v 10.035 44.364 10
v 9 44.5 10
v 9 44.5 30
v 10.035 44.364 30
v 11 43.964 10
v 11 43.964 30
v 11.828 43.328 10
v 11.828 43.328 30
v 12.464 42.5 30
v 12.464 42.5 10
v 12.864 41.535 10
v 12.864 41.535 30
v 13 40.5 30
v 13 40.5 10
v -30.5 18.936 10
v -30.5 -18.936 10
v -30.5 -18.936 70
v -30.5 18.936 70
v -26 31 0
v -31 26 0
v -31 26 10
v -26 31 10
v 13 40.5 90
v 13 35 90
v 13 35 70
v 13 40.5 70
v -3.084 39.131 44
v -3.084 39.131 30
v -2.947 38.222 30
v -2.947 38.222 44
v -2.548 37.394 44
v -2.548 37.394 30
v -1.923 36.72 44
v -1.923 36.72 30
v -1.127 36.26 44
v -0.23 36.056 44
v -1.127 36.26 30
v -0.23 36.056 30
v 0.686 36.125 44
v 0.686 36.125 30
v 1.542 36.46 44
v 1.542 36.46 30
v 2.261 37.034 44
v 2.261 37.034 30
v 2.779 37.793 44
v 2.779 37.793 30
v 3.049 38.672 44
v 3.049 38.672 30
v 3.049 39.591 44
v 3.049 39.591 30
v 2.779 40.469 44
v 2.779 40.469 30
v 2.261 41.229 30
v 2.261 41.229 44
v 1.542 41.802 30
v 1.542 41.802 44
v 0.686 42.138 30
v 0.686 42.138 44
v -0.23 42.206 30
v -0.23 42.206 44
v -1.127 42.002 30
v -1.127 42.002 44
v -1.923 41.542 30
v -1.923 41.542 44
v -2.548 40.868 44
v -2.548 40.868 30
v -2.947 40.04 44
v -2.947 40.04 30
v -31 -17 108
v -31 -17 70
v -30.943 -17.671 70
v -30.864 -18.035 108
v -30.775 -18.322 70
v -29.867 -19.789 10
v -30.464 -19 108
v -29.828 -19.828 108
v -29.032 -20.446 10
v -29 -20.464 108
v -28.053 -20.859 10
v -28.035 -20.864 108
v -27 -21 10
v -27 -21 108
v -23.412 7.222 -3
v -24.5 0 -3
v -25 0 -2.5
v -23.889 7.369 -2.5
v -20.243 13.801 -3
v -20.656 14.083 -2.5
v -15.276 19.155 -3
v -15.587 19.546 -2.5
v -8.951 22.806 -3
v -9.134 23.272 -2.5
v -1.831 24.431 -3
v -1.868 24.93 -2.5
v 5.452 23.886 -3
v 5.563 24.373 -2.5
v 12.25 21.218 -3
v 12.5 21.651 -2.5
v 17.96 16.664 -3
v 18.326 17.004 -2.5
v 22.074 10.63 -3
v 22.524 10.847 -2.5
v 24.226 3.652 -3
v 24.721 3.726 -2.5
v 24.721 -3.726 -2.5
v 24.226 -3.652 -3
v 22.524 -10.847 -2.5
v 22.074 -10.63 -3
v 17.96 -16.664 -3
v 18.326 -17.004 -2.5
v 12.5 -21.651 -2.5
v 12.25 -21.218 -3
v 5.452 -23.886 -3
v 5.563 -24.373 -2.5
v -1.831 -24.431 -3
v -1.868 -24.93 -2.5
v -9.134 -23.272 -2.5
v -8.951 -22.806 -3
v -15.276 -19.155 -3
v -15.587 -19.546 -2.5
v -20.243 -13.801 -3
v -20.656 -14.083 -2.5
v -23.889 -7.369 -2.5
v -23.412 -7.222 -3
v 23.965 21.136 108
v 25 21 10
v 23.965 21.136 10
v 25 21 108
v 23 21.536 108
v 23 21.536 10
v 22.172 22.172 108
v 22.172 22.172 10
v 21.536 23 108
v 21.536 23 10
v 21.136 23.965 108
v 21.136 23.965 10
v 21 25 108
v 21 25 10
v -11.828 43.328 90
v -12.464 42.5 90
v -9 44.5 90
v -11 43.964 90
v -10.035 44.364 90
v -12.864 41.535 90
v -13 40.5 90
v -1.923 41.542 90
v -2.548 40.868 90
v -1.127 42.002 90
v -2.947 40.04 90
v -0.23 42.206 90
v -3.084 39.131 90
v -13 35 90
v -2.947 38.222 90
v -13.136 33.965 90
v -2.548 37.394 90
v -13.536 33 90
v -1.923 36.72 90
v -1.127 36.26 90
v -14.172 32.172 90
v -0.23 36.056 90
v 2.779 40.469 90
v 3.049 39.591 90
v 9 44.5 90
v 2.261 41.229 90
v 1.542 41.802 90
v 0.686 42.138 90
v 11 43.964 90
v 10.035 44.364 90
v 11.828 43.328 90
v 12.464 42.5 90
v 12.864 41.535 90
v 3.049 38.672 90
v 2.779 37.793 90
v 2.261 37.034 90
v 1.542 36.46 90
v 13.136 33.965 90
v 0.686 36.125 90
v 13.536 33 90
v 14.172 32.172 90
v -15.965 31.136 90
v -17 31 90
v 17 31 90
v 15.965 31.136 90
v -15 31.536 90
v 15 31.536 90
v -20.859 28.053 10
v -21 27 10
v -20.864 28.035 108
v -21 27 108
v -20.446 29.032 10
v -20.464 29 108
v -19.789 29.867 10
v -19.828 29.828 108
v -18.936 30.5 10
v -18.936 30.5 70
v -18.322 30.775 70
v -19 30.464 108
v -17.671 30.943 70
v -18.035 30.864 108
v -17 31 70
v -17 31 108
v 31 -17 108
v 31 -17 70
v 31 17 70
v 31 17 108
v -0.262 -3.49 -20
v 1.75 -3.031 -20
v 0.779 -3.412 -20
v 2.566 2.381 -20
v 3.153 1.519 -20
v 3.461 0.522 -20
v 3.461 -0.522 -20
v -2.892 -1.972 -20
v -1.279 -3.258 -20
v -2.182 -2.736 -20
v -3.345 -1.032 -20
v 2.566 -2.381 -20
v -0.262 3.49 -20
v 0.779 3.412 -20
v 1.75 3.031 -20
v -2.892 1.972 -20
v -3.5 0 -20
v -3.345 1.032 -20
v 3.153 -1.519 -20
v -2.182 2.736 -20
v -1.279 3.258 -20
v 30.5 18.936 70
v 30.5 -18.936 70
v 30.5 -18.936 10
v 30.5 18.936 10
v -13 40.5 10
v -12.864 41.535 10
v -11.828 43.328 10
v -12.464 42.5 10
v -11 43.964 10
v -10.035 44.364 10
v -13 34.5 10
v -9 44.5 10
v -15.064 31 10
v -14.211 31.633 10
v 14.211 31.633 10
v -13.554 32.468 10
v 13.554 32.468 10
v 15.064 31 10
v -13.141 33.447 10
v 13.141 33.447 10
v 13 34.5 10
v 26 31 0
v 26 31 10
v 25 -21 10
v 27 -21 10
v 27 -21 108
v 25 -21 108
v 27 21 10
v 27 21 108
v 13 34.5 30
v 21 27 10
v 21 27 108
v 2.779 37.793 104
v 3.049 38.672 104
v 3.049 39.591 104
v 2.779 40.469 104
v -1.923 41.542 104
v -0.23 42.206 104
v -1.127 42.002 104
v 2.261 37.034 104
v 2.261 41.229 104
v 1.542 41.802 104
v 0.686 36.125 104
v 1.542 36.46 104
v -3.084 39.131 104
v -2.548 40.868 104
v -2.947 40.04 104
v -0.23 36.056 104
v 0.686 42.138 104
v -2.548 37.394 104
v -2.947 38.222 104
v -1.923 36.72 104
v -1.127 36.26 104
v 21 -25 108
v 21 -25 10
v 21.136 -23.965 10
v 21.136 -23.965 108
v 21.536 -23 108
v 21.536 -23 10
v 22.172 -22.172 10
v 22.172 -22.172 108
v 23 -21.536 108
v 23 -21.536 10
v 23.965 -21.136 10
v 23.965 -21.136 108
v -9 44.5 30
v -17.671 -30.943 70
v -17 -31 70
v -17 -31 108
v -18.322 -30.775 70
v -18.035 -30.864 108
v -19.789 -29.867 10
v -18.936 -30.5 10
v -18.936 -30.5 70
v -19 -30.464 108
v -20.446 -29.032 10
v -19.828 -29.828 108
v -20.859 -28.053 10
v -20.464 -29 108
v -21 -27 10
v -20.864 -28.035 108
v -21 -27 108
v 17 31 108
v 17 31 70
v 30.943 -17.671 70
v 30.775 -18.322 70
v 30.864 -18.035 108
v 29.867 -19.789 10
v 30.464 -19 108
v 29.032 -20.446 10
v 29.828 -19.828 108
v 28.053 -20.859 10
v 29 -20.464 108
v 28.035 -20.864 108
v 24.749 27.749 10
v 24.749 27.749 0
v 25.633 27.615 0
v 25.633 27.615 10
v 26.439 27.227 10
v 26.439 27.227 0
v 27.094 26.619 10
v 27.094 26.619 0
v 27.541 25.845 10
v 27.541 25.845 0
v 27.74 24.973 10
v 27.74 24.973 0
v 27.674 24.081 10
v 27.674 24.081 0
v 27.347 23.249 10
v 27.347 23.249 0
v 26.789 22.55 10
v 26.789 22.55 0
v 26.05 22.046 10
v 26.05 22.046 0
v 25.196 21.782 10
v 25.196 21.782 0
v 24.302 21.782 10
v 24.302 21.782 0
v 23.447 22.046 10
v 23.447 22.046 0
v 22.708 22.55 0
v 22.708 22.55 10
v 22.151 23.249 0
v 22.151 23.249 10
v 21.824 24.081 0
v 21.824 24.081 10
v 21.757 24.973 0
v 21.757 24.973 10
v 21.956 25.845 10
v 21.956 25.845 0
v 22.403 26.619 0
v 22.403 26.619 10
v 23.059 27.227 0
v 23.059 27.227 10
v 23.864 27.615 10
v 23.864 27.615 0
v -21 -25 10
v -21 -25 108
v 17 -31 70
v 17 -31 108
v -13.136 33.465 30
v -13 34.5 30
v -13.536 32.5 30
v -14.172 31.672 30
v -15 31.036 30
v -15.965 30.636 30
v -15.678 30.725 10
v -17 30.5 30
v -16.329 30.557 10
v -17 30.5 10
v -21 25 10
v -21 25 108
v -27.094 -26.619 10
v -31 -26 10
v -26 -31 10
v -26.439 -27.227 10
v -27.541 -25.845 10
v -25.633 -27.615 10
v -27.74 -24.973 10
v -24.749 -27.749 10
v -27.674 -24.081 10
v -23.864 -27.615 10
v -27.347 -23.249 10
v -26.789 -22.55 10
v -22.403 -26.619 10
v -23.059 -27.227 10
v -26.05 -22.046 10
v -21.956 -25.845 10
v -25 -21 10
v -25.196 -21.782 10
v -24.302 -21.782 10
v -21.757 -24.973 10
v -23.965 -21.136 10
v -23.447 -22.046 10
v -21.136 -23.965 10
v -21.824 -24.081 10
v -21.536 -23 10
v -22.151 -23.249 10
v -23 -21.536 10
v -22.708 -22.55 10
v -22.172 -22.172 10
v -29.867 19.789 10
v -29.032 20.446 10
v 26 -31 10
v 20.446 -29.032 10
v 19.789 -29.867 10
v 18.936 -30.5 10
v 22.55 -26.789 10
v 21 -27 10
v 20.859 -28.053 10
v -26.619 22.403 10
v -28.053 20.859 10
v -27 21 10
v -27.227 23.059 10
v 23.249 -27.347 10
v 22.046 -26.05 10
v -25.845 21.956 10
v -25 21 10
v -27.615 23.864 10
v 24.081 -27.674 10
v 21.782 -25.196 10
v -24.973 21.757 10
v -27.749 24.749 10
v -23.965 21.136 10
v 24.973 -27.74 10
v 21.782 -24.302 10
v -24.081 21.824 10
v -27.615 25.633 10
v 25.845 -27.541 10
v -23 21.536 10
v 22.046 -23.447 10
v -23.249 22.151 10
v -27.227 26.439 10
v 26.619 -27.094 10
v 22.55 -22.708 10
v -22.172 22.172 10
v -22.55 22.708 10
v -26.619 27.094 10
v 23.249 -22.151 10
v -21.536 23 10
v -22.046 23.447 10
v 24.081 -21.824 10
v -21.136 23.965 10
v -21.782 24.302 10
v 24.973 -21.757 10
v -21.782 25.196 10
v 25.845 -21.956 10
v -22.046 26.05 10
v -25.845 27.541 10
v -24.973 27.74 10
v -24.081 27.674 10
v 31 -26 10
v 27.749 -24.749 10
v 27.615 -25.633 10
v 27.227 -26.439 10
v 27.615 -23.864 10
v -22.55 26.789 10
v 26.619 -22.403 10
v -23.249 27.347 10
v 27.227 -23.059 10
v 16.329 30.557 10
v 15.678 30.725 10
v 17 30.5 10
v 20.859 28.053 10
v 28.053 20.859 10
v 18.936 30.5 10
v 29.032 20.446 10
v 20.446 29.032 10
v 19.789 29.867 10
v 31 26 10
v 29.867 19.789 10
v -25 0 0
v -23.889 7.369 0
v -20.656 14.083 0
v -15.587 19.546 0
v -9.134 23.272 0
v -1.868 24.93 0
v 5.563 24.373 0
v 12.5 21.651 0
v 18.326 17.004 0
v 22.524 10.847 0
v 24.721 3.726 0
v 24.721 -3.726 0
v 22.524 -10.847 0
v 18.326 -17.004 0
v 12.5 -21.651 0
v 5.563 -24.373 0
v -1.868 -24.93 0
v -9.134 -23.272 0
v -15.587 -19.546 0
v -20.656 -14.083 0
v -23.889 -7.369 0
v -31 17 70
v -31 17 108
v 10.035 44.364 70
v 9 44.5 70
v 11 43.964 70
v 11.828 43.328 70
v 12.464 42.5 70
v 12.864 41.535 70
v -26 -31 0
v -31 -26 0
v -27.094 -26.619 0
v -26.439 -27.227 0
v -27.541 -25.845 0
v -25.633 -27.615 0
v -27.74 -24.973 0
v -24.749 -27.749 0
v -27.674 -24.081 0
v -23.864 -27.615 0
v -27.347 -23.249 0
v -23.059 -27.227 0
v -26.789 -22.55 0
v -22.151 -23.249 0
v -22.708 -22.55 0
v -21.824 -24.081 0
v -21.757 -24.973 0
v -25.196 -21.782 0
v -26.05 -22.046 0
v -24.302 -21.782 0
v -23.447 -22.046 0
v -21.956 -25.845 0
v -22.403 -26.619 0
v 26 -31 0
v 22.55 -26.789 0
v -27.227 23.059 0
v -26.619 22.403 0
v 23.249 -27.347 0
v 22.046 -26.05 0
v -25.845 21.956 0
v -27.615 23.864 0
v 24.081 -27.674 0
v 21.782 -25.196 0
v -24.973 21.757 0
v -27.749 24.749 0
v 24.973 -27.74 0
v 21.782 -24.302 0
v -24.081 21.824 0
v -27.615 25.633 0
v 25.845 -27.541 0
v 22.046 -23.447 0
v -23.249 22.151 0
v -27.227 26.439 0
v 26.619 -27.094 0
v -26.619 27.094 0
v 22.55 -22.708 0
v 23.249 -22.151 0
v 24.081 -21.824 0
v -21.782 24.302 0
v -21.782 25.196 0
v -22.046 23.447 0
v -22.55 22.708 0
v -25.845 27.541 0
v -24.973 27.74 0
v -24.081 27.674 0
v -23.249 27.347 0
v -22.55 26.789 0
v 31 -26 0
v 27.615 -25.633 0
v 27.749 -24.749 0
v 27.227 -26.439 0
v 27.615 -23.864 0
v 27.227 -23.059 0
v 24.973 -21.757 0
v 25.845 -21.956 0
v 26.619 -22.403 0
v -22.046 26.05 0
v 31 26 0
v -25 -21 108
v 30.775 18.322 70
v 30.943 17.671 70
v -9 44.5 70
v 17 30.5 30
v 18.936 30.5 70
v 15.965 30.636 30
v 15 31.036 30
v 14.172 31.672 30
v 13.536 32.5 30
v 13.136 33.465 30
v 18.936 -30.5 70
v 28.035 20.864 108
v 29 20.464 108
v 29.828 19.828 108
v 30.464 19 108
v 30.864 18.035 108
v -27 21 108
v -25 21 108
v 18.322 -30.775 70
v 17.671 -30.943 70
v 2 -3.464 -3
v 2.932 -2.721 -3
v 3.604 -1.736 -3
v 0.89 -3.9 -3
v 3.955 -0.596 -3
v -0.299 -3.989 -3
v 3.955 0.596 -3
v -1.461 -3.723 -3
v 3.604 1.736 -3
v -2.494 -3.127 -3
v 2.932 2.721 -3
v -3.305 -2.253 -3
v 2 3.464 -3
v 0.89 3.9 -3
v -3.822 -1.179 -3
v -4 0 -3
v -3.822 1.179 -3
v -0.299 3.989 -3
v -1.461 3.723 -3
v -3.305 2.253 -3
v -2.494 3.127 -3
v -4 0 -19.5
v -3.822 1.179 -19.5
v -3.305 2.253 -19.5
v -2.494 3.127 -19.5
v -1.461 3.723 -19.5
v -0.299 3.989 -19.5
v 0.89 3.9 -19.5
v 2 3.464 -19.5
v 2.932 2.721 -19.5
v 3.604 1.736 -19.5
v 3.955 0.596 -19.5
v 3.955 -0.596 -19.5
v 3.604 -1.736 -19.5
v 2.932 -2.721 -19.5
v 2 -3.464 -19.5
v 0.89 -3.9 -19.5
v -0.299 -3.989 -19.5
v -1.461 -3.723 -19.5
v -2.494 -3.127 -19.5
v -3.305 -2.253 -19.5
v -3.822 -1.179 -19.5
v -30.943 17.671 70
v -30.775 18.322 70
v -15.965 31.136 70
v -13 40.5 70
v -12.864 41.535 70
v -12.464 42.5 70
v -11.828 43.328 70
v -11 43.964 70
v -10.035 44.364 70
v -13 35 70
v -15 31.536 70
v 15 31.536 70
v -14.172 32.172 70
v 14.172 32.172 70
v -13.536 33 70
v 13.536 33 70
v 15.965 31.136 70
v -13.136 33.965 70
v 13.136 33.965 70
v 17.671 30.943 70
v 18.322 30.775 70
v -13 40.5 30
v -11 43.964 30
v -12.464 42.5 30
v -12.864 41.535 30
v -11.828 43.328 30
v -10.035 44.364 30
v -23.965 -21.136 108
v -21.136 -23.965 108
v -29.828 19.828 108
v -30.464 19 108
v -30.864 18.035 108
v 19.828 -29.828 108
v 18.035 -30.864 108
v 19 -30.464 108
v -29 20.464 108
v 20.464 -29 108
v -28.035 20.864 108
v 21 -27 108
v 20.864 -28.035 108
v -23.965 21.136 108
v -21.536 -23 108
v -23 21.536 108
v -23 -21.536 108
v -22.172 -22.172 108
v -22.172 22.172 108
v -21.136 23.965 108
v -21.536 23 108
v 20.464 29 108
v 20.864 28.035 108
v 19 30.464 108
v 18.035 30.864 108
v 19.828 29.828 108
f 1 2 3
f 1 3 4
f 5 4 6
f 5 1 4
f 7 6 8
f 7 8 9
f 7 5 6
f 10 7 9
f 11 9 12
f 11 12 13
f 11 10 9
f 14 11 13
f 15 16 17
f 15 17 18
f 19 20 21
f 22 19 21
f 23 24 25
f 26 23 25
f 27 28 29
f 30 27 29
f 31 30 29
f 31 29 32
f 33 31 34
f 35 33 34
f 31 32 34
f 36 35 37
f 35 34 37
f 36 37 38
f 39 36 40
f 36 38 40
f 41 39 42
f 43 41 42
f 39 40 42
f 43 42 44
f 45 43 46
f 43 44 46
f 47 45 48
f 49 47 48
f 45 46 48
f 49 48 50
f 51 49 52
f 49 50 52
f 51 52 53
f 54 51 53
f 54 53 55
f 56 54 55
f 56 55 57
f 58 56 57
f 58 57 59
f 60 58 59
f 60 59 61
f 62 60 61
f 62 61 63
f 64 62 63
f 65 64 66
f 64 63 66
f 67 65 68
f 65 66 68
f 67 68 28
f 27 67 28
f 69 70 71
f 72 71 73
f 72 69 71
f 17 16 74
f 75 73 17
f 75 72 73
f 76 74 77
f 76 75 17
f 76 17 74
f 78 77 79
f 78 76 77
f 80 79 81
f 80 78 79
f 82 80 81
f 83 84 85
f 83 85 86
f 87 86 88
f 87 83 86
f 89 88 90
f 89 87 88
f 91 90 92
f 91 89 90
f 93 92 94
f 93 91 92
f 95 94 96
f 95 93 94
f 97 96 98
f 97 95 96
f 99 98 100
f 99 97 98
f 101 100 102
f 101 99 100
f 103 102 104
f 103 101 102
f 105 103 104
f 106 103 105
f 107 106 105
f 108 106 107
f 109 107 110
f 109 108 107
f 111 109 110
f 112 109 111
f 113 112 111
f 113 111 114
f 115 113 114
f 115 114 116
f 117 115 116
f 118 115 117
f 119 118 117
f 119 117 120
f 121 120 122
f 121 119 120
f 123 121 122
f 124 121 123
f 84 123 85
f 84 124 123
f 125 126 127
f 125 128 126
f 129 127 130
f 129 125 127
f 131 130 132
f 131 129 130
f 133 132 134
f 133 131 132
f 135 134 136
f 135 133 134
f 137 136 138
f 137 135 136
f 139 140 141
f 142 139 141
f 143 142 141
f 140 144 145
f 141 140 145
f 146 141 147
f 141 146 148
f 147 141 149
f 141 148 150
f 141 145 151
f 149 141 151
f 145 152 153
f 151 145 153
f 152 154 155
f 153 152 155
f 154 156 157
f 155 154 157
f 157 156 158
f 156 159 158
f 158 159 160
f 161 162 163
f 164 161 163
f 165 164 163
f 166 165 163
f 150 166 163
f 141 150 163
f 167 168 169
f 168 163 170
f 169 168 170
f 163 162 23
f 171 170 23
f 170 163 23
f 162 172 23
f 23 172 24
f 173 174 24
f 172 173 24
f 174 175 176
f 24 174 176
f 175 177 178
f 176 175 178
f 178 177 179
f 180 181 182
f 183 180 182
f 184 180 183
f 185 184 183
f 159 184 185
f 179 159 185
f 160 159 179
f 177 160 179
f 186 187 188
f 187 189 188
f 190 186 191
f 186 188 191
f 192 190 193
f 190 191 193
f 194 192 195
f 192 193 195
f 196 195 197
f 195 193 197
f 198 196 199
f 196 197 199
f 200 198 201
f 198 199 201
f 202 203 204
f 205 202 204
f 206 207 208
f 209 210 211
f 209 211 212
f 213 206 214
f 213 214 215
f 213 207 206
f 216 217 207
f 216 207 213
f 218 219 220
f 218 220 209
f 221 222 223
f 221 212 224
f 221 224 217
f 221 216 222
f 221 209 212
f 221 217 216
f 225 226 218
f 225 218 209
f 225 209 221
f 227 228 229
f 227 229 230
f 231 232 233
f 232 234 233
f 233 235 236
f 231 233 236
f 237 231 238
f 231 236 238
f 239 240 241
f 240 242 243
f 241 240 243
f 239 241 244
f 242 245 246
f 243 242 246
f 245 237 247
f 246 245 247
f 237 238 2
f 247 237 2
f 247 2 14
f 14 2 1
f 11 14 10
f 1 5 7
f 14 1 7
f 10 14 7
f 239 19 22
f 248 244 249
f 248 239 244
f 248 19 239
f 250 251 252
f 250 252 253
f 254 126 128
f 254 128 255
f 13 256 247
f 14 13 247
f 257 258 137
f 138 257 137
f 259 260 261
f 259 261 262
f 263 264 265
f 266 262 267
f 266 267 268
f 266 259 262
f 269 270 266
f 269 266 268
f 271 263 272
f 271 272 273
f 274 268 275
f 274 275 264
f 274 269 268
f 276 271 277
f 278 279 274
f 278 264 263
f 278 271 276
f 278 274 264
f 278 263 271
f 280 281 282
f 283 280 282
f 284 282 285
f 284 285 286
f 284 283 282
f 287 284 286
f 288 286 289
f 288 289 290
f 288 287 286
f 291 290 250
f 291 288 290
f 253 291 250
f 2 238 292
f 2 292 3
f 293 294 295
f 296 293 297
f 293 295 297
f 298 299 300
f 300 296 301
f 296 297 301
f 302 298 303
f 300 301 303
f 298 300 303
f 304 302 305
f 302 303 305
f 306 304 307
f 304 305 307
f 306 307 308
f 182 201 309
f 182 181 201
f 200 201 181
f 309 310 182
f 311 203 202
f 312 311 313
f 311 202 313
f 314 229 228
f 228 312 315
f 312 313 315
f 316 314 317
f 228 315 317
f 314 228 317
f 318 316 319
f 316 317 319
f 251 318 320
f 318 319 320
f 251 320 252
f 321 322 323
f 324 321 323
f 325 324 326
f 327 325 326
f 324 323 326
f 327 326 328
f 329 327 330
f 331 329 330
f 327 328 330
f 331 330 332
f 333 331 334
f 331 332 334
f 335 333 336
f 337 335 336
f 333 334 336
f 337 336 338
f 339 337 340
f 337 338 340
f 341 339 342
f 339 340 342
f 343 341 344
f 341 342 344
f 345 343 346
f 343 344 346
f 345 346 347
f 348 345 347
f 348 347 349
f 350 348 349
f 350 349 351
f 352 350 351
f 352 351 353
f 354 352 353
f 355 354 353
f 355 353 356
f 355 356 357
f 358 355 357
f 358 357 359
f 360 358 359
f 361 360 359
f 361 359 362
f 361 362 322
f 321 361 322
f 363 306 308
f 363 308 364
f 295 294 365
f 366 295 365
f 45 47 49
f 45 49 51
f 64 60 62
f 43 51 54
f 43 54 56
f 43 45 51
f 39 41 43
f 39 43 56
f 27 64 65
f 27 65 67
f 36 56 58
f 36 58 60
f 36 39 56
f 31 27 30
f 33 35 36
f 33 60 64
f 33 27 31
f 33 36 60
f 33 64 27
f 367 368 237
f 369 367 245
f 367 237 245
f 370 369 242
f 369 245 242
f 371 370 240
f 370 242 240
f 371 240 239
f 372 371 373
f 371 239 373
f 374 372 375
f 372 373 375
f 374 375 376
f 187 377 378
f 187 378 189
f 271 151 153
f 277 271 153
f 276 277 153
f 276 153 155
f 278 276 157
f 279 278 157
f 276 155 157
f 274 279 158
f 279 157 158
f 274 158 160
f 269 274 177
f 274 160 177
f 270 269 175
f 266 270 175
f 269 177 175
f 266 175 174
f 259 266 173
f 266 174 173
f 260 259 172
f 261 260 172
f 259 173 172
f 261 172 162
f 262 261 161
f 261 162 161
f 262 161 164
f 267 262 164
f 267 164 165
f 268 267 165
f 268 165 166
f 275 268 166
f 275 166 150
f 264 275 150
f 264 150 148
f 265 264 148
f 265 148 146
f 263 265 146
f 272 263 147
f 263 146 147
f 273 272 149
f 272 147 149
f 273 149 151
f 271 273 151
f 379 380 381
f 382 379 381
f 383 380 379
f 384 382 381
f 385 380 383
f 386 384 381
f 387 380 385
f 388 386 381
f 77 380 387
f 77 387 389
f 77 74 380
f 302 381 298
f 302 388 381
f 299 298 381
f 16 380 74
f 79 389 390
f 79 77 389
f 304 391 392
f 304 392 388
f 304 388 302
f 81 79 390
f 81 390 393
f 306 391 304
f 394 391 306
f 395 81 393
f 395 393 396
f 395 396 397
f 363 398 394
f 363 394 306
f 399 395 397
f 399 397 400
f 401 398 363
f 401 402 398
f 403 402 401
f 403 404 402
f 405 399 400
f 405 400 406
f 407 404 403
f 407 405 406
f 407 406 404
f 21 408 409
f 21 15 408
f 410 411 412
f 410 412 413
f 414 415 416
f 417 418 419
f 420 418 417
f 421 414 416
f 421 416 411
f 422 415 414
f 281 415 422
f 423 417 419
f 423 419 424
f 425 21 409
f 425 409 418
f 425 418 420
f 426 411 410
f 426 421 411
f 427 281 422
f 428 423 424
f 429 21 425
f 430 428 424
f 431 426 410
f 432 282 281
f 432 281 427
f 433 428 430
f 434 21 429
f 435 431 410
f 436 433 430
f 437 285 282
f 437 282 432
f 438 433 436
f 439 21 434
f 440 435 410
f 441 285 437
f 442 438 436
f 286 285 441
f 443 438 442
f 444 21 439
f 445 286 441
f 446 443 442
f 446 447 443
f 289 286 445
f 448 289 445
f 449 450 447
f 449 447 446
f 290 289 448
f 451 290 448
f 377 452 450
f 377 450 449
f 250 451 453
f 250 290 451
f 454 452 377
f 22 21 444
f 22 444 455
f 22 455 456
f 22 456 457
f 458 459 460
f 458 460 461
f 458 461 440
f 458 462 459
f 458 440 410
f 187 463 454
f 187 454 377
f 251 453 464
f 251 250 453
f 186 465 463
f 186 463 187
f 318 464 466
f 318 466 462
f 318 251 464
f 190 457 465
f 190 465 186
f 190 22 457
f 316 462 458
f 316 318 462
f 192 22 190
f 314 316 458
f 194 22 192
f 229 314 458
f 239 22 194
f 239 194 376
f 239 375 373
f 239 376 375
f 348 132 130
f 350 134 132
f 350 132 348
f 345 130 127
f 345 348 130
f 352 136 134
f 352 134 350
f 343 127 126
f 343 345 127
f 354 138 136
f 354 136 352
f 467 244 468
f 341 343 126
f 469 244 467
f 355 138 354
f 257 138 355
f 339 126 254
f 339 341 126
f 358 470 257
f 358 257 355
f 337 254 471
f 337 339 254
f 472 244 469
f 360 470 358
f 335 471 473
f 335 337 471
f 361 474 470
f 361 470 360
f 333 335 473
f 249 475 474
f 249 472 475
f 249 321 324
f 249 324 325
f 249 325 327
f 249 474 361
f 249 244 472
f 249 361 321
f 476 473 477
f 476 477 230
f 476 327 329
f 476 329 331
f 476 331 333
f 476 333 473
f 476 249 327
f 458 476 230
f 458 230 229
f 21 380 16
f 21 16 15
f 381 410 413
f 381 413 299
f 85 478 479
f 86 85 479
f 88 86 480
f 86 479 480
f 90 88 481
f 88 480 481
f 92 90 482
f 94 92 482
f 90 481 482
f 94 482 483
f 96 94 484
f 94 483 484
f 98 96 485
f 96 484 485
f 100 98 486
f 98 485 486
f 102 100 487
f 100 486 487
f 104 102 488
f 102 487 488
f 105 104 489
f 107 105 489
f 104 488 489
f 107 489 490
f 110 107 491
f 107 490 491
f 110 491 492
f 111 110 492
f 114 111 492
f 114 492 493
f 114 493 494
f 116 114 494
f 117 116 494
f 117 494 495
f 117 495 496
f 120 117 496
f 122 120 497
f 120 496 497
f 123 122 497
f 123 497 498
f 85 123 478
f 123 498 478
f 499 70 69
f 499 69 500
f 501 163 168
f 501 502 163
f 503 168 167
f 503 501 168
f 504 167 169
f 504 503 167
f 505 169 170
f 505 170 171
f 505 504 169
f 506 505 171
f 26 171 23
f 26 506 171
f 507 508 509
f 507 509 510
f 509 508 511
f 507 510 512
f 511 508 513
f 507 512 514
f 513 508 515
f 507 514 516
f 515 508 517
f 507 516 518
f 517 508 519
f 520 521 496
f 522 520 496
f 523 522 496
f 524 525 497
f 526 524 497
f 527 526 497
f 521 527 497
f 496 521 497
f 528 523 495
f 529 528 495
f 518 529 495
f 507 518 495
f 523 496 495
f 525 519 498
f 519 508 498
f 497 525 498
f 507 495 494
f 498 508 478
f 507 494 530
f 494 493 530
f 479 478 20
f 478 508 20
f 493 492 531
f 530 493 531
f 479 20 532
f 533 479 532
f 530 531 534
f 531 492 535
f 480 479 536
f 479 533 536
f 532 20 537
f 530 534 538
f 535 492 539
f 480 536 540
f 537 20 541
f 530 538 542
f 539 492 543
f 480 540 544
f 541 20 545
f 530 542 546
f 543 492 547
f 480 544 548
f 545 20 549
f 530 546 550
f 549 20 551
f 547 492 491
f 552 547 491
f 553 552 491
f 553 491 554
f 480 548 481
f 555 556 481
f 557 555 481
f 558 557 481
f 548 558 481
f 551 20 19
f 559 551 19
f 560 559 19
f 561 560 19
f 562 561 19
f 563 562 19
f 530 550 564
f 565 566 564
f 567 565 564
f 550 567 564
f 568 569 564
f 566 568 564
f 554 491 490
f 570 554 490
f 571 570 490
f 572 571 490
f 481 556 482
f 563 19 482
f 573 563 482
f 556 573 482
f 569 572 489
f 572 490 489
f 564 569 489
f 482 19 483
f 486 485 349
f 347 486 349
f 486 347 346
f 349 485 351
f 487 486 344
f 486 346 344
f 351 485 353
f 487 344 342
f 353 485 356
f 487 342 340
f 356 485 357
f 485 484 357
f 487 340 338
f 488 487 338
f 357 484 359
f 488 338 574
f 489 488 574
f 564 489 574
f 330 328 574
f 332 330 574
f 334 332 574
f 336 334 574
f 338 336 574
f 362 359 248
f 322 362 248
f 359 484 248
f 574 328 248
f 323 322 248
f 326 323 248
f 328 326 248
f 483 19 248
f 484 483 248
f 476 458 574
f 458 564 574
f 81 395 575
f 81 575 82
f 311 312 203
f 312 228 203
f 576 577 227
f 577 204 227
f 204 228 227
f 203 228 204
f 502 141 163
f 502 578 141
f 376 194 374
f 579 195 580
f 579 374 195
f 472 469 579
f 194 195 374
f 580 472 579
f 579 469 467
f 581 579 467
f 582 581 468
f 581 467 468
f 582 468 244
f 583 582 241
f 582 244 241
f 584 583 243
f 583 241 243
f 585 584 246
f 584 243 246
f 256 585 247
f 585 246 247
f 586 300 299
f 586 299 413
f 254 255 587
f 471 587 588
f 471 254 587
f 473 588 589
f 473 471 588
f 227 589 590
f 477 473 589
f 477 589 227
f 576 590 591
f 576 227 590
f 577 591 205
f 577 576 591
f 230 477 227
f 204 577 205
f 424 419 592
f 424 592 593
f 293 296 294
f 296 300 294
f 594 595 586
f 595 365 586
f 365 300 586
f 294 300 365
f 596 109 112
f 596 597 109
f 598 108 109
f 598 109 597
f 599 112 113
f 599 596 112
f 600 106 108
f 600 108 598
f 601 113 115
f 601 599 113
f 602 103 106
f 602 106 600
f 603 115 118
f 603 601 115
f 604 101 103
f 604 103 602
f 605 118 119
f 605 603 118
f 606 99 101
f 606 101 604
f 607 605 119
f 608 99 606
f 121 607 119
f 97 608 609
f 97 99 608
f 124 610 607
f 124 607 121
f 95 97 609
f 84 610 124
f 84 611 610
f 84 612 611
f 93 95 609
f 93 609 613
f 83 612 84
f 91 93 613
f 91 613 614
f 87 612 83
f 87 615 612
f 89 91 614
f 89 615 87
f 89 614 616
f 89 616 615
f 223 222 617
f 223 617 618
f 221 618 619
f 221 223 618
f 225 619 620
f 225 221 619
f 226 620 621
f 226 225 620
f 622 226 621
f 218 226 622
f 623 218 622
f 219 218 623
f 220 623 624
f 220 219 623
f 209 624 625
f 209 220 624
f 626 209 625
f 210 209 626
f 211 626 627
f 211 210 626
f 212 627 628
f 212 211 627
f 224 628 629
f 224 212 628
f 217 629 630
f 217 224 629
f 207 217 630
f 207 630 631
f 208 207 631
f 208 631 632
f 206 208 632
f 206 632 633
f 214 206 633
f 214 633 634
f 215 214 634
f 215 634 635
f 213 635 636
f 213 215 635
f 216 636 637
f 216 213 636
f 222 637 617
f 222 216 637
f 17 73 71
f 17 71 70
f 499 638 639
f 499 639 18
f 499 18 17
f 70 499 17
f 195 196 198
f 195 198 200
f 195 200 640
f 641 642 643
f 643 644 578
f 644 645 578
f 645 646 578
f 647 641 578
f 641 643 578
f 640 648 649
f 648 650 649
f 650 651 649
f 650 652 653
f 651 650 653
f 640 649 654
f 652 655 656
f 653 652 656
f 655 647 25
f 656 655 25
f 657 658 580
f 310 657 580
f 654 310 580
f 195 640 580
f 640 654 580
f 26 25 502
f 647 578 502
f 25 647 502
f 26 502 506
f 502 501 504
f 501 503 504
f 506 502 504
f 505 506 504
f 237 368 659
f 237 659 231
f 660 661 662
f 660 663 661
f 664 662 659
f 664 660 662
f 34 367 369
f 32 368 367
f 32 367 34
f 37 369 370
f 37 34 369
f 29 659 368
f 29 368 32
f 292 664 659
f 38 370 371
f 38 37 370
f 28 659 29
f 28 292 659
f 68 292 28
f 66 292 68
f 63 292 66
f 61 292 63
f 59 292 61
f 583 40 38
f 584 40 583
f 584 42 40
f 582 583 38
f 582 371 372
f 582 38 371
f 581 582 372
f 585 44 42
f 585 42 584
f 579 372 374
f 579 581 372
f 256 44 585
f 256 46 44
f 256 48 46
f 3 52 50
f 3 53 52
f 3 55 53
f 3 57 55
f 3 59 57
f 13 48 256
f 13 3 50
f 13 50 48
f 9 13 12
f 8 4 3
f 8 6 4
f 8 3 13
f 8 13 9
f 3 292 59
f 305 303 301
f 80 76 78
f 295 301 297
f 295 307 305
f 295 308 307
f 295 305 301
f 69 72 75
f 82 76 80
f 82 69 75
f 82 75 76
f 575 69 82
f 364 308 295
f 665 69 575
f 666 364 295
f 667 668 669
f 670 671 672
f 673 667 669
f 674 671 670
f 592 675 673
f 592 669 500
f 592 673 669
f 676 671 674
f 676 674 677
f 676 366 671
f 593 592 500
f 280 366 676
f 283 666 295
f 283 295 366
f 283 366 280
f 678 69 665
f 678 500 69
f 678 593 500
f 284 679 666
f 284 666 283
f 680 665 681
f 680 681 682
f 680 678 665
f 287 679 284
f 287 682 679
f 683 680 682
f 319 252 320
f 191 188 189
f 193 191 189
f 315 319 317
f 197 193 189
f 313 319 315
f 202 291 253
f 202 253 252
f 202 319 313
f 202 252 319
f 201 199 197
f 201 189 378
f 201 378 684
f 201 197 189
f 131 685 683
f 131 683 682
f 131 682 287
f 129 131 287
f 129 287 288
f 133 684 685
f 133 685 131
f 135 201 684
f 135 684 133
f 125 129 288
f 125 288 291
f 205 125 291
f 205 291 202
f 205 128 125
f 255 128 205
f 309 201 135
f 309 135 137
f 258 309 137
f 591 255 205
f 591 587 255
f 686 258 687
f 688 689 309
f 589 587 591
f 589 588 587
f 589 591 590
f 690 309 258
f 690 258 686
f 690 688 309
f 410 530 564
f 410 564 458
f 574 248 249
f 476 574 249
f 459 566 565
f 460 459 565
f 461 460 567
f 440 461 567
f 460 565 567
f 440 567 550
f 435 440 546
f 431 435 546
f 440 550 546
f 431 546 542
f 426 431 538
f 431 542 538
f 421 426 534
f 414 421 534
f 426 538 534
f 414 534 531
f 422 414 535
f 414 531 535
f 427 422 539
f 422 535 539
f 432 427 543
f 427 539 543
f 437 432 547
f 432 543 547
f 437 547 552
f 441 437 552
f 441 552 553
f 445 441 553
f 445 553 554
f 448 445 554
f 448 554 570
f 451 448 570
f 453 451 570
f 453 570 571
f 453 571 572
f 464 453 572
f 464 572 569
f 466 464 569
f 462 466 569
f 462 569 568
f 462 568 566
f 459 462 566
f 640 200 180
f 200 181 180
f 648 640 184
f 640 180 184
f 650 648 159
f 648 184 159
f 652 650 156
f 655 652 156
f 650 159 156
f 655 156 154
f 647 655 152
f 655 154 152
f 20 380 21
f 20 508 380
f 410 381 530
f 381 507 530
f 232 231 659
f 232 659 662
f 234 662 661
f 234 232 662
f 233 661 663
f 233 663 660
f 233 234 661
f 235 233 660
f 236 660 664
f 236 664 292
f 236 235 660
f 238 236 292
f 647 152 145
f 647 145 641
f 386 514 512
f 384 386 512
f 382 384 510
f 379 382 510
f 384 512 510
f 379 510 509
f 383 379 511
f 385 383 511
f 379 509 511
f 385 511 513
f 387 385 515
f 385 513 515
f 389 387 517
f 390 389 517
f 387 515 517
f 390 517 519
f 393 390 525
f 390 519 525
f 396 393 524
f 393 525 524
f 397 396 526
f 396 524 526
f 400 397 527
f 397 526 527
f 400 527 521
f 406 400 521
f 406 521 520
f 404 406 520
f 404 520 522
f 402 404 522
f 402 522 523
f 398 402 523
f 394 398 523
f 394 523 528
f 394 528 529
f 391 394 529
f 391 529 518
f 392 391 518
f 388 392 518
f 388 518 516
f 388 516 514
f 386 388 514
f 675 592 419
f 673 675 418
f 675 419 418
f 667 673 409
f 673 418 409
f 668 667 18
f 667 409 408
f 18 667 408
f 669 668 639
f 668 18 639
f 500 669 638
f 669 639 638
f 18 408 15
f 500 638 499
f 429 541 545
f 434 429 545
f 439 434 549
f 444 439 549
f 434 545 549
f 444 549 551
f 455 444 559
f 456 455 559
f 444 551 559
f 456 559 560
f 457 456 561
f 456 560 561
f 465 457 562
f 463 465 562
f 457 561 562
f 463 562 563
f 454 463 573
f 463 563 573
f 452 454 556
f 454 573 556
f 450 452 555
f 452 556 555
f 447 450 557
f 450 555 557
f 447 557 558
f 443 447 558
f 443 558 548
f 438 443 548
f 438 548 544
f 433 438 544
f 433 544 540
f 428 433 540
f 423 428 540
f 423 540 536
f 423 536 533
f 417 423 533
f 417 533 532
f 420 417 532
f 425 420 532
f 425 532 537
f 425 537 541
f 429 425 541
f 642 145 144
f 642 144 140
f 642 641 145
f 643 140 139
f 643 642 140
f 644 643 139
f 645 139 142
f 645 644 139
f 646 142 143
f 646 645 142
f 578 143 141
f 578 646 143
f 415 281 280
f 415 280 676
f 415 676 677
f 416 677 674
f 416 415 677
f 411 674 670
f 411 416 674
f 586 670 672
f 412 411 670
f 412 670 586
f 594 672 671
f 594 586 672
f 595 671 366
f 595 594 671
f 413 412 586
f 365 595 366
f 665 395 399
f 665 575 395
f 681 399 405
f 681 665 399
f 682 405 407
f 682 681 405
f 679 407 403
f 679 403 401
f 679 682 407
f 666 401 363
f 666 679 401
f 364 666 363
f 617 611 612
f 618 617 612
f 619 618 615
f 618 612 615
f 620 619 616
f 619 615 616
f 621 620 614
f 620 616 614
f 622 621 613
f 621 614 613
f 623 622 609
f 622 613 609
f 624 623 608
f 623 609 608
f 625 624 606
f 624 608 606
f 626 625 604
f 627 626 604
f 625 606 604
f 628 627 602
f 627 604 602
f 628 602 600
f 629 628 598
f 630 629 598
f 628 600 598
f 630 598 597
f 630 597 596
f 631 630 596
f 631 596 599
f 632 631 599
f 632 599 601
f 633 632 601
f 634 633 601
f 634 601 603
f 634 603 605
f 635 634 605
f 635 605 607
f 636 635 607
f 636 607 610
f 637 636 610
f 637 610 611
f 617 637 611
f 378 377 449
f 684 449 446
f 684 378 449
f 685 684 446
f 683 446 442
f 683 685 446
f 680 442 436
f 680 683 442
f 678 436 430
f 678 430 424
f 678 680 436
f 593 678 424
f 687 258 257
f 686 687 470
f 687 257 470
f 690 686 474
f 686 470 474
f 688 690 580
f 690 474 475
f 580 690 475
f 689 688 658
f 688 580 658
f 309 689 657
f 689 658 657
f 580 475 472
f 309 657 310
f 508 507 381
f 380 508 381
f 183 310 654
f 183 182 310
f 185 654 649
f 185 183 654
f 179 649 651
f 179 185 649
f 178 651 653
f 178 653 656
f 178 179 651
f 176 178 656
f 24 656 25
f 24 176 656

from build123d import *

# Parameters (mm, degrees)
SKETCH_1_W               = 62
SKETCH_1_H               = 62
EXTRUDE_1_DEPTH          = 10
SKETCH_2_W               = 61
SKETCH_2_H               = 61
EXTRUDE_2_DEPTH          = 60
SKETCH_3_W               = 62
SKETCH_3_H               = 62
EXTRUDE_3_DEPTH          = 38
CUT_EXTRUDE_START        = -98
SKETCH_4_W               = 14.732123786
SKETCH_4_H               = 13.996978426
CUT_EXTRUDE_1_DEPTH      = 98
FILLET_1_R               = 4
FILLET_3_R               = 4
SKETCH_5_R               = 4
EXTRUDE_4_DEPTH          = 20
PATTERN_CIRCULAR_4_COUNT = 4
FILLET_4_R               = 4
FILLET_5_R               = 4
CHAMFER_1_SIZE           = 5
SKETCH_6_R               = 25
EXTRUDE_5_DEPTH          = 3
SKETCH_7_R               = 3
CUT_EXTRUDE_2_DEPTH      = 12
PATTERN_CIRCULAR_5_COUNT = 4
CHAMFER_2_SIZE           = 0.5
SKETCH_8_W               = 26
SKETCH_8_H               = 20
EXTRUDE_6_DEPTH          = 14
SKETCH_9_R               = 3.083920488
EXTRUDE_7_DEPTH          = 14
FILLET_START             = 9
FILLET_6_DEPTH           = 21
FILLET_START_2           = 10
FILLET_6_2_DEPTH         = 20
PATTERN_LINEAR_2_COUNT   = 2
PATTERN_LINEAR_2_PITCH   = 60
FILLET_7_R               = 4


with BuildPart() as part:
    # 草图1 → 凸台-拉伸1 (new body)
    with BuildSketch(Plane.XY):
        Rectangle(SKETCH_1_W, SKETCH_1_H)
    extrude(amount=EXTRUDE_1_DEPTH)

    # 草图2 → 凸台-拉伸2 (add)
    with BuildSketch(Plane.XY.offset(10)):
        Rectangle(SKETCH_2_W, SKETCH_2_H)
    extrude(amount=EXTRUDE_2_DEPTH)

    # 草图3 → 凸台-拉伸3 (add)
    with BuildSketch(Plane.XY.offset(70)):
        Rectangle(SKETCH_3_W, SKETCH_3_H)
    extrude(amount=EXTRUDE_3_DEPTH)

    # 草图4 → 切除-拉伸1 (cut)
    with BuildSketch(Plane.XY.offset(108).offset(CUT_EXTRUDE_START)):
        with Locations((-28.366061893, 27.998489213)):
            Rectangle(SKETCH_4_W, SKETCH_4_H)
    cut_extrude_1 = extrude(amount=CUT_EXTRUDE_1_DEPTH, mode=Mode.SUBTRACT)

    # 圆角1
    fillet_1_edges = [part.edges().sort_by_distance(p)[0] for p in [
        (-21, 21, 59),
    ]]
    fillet(fillet_1_edges, radius=FILLET_1_R)

    # 圆角3
    fillet_3_edges = [part.edges().sort_by_distance(p)[0] for p in [
        (-31, 21, 89),
        (-21, 31, 89),
    ]]
    fillet(fillet_3_edges, radius=FILLET_3_R)

    # 草图5 → 凸台-拉伸4 (add)
    with BuildSketch(Plane(origin=(0, 0, 0), x_dir=(-1, 0, 0), z_dir=(0, 0, -1))):
        Circle(SKETCH_5_R)
    extrude(amount=EXTRUDE_4_DEPTH)

    # 阵列(圆周)4: 切除-拉伸1 ×4 about axis
    pattern_circular_4_axis = Axis((0, 0, 0), (0, 0, 1))
    for i in range(1, PATTERN_CIRCULAR_4_COUNT):
        add(cut_extrude_1.rotate(pattern_circular_4_axis, i * 360 / PATTERN_CIRCULAR_4_COUNT), mode=Mode.SUBTRACT)

    # 圆角4
    fillet_4_edges = [part.edges().sort_by_distance(p)[0] for p in [
        (-21, -21, 59),
        (21, -21, 59),
        (21, 21, 59),
    ]]
    fillet(fillet_4_edges, radius=FILLET_4_R)

    # 圆角5
    fillet_5_edges = [part.edges().sort_by_distance(p)[0] for p in [
        (-31, -21, 89),
        (-21, -31, 89),
        (21, -31, 89),
        (31, -21, 89),
        (31, 21, 89),
        (21, 31, 89),
    ]]
    fillet(fillet_5_edges, radius=FILLET_5_R)

    # 倒角1
    chamfer_1_edges = [part.edges().sort_by_distance(p)[0] for p in [
        (31, -31, 5),
        (-31, -31, 5),
        (-31, 31, 5),
        (31, 31, 5),
    ]]
    chamfer(chamfer_1_edges, length=CHAMFER_1_SIZE)

    # 草图6 → 凸台-拉伸5 (add)
    with BuildSketch(Plane(origin=(0, 0, 0), x_dir=(-1, 0, 0), z_dir=(0, 0, -1))):
        Circle(SKETCH_6_R)
    extrude(amount=EXTRUDE_5_DEPTH)

    # 草图7 → 切除-拉伸2 (cut)
    with BuildSketch(Plane(origin=(0, 0, 0), x_dir=(-1, 0, 0), z_dir=(0, 0, -1))):
        with Locations((24.748737342, 24.748737342)):
            Circle(SKETCH_7_R)
    cut_extrude_2 = extrude(amount=-CUT_EXTRUDE_2_DEPTH, mode=Mode.SUBTRACT)

    # 阵列(圆周)5: 切除-拉伸2 ×4 about axis
    pattern_circular_5_axis = Axis((0, 0, 0), (0, 0, 1))
    for i in range(1, PATTERN_CIRCULAR_5_COUNT):
        add(cut_extrude_2.rotate(pattern_circular_5_axis, i * 360 / PATTERN_CIRCULAR_5_COUNT), mode=Mode.SUBTRACT)

    # 倒角2
    chamfer_2_edges = [part.edges().sort_by_distance(p)[0] for p in [
        (25, 0, -3),
        (4, 0, -20),
    ]]
    chamfer(chamfer_2_edges, length=CHAMFER_2_SIZE)

    # 草图8 → 凸台-拉伸6 (add)
    with BuildSketch(Plane(origin=(0, 30.5, 0), x_dir=(1, 0, 0), z_dir=(0, 1, 0))):
        with Locations((0, -20)):
            Rectangle(SKETCH_8_W, SKETCH_8_H)
    extrude_6 = extrude(amount=EXTRUDE_6_DEPTH)

    # 草图9 → 凸台-拉伸7 (add)
    with BuildSketch(Plane.XY.offset(30)):
        with Locations(Location((0, 39.131165124, 0), (0, 0, 180))):
            Circle(SKETCH_9_R)
    extrude_7 = extrude(amount=EXTRUDE_7_DEPTH)

    # 圆角6: read off the stored shape, not the designer's step
    # 圆角6 outline → 圆角6 (cut)
    with BuildSketch(Plane.XY.offset(FILLET_START)):
        with BuildLine():
            ThreePointArc((9, 44.5), (11.828427125, 43.328427125), (13, 40.5))
            Line((13, 40.5), (13, 44.5))
            Line((13, 44.5), (9, 44.5))
        make_face()
        with BuildLine():
            ThreePointArc((-13, 40.5), (-11.828427125, 43.328427125), (-9, 44.5))
            Line((-9, 44.5), (-13, 44.5))
            Line((-13, 44.5), (-13, 40.5))
        make_face()
    extrude(amount=FILLET_6_DEPTH, mode=Mode.SUBTRACT)

    # Fillet 6 2 outline → Fillet 6 2 (add)
    with BuildSketch(Plane.XY.offset(FILLET_START_2)):
        with BuildLine():
            ThreePointArc((17, 30.5), (14.171572875, 31.671572875), (13, 34.5))
            Line((13, 34.5), (13, 30.5))
            Line((13, 30.5), (17, 30.5))
        make_face()
        with BuildLine():
            Line((-17, 30.5), (-13, 30.5))
            Line((-13, 30.5), (-13, 34.5))
            ThreePointArc((-13, 34.5), (-14.171572875, 31.671572875), (-17, 30.5))
        make_face()
    extrude(amount=FILLET_6_2_DEPTH)

    # 阵列(线性)2: 凸台-拉伸6, 凸台-拉伸7 ×2
    with Locations(*[(0, 0, i * PATTERN_LINEAR_2_PITCH) for i in range(1, PATTERN_LINEAR_2_COUNT)]):
        add(extrude_6)
        add(extrude_7)

    # 圆角7
    fillet_7_edges = [part.edges().sort_by_distance(p)[0] for p in [
        (13, 31, 80),
        (-13, 31, 80),
    ]]
    fillet(fillet_7_edges, radius=FILLET_7_R - 0.0001)  # a hair under: the kernel refuses the full size
    fillet_7_2_edges = [part.edges().sort_by_distance(p)[0] for p in [
        (13, 44.5, 80),
        (-13, 44.5, 80),
    ]]
    fillet(fillet_7_2_edges, radius=FILLET_7_R)


solid = part.part
